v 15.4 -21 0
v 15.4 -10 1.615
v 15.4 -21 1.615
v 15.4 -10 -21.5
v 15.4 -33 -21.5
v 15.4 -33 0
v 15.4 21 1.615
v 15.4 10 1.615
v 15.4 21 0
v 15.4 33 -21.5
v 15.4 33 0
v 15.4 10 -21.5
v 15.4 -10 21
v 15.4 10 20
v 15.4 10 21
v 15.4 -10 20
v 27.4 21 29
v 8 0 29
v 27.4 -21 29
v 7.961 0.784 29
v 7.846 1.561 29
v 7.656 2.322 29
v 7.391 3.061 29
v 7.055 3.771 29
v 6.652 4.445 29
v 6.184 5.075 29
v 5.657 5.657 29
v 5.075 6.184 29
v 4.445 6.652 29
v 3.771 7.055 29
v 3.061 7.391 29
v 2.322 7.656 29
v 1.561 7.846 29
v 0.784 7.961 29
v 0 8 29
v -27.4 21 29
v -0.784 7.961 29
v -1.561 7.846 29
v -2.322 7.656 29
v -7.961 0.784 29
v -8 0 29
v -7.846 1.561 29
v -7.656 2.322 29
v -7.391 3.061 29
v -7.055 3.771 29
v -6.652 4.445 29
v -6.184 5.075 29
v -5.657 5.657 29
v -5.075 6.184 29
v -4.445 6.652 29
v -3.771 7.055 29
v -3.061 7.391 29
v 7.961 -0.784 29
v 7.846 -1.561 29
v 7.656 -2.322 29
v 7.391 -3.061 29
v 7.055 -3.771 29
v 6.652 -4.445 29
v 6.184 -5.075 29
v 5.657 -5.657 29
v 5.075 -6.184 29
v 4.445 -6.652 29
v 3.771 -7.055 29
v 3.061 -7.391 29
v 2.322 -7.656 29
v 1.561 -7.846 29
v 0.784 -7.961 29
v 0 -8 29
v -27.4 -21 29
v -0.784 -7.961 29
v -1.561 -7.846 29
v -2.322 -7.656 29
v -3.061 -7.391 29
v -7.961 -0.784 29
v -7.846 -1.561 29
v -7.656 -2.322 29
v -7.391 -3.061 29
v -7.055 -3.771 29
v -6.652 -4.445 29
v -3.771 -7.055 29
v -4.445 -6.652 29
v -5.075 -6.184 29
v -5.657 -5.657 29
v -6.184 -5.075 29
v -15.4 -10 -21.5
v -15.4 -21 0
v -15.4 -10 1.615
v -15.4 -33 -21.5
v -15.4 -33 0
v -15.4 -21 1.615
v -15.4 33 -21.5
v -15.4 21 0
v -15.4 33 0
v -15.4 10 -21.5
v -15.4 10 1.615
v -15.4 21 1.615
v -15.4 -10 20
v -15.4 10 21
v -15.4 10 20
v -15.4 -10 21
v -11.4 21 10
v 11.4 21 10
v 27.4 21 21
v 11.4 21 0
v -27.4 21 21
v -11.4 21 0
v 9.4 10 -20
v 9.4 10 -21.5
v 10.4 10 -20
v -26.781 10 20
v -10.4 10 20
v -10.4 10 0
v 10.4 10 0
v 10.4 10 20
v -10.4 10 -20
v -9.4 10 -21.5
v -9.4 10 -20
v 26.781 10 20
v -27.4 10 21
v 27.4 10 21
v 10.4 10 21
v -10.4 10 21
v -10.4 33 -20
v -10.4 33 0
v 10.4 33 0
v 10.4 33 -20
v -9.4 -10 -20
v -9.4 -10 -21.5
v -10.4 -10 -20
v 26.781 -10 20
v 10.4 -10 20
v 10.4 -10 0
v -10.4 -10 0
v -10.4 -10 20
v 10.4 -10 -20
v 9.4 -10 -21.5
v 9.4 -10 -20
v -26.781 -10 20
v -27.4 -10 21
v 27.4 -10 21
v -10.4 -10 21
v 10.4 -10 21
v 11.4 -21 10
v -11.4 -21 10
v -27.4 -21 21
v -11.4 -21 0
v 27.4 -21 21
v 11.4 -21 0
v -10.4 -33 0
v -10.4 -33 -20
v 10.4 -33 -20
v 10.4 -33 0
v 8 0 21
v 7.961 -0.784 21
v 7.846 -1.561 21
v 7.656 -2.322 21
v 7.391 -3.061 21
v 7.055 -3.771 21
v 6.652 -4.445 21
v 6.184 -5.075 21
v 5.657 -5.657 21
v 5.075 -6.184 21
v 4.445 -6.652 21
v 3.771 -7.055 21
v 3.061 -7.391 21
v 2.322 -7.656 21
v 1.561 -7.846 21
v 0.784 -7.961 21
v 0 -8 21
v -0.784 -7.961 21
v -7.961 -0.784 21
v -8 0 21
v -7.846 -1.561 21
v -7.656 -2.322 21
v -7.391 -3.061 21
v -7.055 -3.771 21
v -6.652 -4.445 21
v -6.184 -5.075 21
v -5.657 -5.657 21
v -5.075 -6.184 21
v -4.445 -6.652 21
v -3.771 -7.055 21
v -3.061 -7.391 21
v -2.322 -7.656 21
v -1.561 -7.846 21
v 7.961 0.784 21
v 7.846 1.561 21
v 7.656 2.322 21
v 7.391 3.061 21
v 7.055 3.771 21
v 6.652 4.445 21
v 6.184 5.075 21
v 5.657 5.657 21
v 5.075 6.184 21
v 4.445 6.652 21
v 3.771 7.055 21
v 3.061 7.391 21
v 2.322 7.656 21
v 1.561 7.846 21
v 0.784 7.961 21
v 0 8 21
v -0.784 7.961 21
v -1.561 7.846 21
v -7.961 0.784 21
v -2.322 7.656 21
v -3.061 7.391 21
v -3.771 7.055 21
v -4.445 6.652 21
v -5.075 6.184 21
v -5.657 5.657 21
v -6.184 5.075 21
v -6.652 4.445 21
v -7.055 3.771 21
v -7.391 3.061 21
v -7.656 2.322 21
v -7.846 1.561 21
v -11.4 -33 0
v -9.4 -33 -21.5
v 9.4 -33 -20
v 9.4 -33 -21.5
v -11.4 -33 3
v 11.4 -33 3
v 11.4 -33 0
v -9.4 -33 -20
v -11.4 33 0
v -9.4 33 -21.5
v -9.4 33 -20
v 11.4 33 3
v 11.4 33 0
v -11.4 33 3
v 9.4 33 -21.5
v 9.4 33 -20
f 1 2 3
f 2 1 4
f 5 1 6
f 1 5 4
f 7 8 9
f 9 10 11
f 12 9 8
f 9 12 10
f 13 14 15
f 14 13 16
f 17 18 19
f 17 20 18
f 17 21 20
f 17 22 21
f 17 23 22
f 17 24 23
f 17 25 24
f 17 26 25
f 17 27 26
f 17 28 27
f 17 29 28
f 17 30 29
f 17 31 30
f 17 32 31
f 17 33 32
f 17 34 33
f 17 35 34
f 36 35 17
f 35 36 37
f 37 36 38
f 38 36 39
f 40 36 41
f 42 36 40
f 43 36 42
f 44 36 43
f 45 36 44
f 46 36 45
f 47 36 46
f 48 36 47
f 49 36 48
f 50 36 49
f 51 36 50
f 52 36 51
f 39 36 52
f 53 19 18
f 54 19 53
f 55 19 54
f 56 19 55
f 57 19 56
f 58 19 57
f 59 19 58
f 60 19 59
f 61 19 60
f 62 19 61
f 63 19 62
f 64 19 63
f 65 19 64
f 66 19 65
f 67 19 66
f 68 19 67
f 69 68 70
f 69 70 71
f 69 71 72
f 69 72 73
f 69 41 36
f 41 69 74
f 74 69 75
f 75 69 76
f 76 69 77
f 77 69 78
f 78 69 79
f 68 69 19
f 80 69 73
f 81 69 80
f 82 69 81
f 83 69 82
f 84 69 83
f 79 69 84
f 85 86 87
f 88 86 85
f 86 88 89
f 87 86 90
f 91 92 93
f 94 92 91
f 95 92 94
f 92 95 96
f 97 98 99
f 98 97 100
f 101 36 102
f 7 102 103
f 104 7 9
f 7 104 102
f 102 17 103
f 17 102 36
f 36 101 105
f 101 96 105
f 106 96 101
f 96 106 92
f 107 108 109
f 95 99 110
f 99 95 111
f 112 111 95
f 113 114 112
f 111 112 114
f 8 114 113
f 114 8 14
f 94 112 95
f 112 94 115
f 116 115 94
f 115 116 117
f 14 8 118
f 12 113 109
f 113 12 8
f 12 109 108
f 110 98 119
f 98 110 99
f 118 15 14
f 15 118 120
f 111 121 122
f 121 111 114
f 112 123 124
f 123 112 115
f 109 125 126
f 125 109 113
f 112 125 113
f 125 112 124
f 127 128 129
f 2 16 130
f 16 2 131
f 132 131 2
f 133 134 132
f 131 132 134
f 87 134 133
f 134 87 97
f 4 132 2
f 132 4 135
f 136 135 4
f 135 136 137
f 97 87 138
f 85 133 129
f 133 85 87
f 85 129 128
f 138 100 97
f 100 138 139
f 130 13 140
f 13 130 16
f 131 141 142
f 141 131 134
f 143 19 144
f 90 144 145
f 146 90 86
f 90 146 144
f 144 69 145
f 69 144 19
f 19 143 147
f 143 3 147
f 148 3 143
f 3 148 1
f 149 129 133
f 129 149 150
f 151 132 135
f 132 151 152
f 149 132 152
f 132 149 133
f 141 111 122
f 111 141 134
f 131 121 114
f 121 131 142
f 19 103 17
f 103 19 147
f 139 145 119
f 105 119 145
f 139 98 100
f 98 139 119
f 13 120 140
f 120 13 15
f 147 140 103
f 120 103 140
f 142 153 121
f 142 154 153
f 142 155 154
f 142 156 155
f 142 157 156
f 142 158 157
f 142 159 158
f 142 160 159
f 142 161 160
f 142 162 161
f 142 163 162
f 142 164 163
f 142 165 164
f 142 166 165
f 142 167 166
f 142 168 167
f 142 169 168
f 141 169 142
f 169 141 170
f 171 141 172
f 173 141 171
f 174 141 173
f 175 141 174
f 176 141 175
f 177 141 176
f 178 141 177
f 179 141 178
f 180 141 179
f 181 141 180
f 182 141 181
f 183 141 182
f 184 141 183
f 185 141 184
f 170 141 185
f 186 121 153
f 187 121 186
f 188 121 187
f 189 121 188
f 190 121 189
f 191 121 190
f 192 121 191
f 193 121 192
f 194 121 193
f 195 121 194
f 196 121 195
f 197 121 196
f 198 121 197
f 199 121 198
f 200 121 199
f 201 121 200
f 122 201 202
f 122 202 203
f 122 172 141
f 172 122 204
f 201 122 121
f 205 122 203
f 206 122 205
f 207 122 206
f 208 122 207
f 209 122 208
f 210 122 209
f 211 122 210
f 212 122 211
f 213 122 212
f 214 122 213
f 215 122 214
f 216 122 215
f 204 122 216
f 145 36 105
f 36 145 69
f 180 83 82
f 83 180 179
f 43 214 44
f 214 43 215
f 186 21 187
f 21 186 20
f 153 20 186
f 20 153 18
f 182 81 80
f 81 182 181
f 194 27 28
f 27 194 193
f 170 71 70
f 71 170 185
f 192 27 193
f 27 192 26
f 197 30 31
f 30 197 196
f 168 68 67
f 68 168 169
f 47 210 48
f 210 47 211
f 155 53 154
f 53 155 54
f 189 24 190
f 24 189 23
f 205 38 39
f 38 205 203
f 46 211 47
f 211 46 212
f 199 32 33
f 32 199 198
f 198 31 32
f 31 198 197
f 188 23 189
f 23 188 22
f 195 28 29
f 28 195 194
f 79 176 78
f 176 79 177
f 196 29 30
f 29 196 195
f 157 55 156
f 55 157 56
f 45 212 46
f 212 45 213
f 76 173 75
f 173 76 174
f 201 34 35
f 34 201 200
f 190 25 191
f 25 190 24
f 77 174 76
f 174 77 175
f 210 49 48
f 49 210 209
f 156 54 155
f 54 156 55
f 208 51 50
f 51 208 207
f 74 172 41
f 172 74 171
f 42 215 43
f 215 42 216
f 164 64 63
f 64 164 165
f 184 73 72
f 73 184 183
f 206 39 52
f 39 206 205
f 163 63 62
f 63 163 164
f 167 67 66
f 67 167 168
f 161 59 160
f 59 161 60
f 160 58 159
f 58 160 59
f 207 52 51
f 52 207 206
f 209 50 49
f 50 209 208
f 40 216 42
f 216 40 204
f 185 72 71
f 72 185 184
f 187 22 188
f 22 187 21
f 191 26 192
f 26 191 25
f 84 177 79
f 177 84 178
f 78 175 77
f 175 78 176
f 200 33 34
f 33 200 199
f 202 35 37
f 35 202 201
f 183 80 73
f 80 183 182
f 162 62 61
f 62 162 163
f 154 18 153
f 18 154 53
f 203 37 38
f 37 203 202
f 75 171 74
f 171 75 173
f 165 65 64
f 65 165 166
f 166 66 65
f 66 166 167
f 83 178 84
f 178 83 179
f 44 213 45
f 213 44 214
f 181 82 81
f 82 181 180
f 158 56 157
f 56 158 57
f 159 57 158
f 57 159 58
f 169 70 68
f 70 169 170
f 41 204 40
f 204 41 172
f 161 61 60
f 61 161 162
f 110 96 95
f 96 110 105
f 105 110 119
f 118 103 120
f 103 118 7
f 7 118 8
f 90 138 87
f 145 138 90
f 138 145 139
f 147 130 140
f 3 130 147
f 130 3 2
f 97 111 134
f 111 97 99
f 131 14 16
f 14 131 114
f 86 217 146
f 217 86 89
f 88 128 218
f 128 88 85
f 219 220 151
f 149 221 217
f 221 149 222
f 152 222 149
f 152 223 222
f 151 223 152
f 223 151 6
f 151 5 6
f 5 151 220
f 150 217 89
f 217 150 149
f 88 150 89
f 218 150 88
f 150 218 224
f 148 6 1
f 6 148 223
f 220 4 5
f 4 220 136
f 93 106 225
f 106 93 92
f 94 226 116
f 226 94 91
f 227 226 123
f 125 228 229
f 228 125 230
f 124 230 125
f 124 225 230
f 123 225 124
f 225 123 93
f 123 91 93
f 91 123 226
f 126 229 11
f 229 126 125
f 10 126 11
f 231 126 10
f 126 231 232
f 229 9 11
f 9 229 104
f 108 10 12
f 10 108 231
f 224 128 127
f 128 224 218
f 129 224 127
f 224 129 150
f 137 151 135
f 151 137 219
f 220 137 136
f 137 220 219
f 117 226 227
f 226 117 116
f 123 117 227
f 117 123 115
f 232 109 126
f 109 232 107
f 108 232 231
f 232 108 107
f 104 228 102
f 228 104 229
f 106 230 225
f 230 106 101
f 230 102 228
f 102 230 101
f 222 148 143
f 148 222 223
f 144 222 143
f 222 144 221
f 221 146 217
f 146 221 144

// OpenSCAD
// file: ../perpendicular-u-joint-guard-v1.3-triangular-corner-fills/candidate_triangular_corner_fills.scad
// Candidate v1.3: four triangular concave-corner fill blocks.
//
// Base: accepted v0.7 eaves12 geometry. v0.9/v1.0/v1.1/v1.2 are not
// imported. Each corner block is a real triangular prism: broad at the roof,
// tapering continuously toward z=0, and overlapping the U side wall.

use <../perpendicular-u-joint-guard-v0.7/perpendicular_double_u_guard.scad>;

$fn = 48;
PART = "candidate_iso";

// Explicit v0.7 interface values.
roof_x_outer = 27.4;       // accepted eaves12 roof: -27.4..+27.4
side_wall_x_outer = 15.4;  // existing side-wall outer edge
blue_tube_x_outer = 10.0;  // blue lower 20x20 tube half-width
plate_y_inner = 10.0;
plate_y_outer = 21.0;
plate_depth_y = plate_y_outer - plate_y_inner; // 11 mm per front/back U plate

// The top edge is 0.5 mm inside the roof volume (roof underside z=21), and
// the lower point enters the side wall by 1 mm in X.  The XZ area therefore
// has positive overlap at both ends, not edge-only contact.
triangle_top_z = 21.5;
triangle_bottom_z = 0.0;
triangle_roof_overlap_z = triangle_top_z - 21.0;
triangle_side_overlap_x = 1.0;
triangle_inner_x = side_wall_x_outer - triangle_side_overlap_x; // 14.4

// Bottom retaining-hook contract copied from v0.7 for explicit verification.
hook_height_z = 1.5;
u_bottom_z = -21.0;
hook_top_z = u_bottom_z + hook_height_z; // -19.5

assert(plate_depth_y == 11, "每个三角块的前后板深必须是 11 mm");
assert(triangle_top_z > 21 && triangle_bottom_z == 0,
       "三角块上端必须搭入屋檐、下端落到 z=0");
assert(triangle_inner_x > blue_tube_x_outer,
       "三角块下端不得进入蓝色方管 x=-10..+10 包络");
assert(triangle_side_overlap_x > 0 && triangle_roof_overlap_z > 0,
       "三角块必须与屋檐和侧墙都有正重叠");
assert(hook_height_z == 1.5 && u_bottom_z == -21 && hook_top_z == -19.5,
       "底部卡脚必须保持 z=-21..-19.5");

// A polygon in XZ is extruded only through the corresponding front/back U
// plate. The center y=-10..+10 passage remains open.
module triangular_fill_xz(points, yc) {
    translate([0, yc, 0])
        rotate([90, 0, 0])
            linear_extrude(height = plate_depth_y,
                           center = true,
                           convexity = 10)
                polygon(points = points);
}

module front_neg_x_triangle() {
    // -X roof end -> +X inward. Top wide, lower point at the side wall.
    triangular_fill_xz([
        [-roof_x_outer, 21.0],
        [-triangle_inner_x, triangle_top_z],
        [-triangle_inner_x, triangle_bottom_z]
    ], (plate_y_inner + plate_y_outer) / 2);
}

module front_pos_x_triangle() {
    // +X roof end -> -X inward. Mirrored triangle.
    triangular_fill_xz([
        [roof_x_outer, 21.0],
        [triangle_inner_x, triangle_top_z],
        [triangle_inner_x, triangle_bottom_z]
    ], (plate_y_inner + plate_y_outer) / 2);
}

module back_neg_x_triangle() {
    triangular_fill_xz([
        [-roof_x_outer, 21.0],
        [-triangle_inner_x, triangle_top_z],
        [-triangle_inner_x, triangle_bottom_z]
    ], -(plate_y_inner + plate_y_outer) / 2);
}

module back_pos_x_triangle() {
    triangular_fill_xz([
        [roof_x_outer, 21.0],
        [triangle_inner_x, triangle_top_z],
        [triangle_inner_x, triangle_bottom_z]
    ], -(plate_y_inner + plate_y_outer) / 2);
}

module front_two_triangular_fills() {
    union() {
        front_neg_x_triangle();
        front_pos_x_triangle();
    }
}

module back_two_triangular_fills() {
    union() {
        back_neg_x_triangle();
        back_pos_x_triangle();
    }
}

module all_four_triangular_fills() {
    union() {
        front_two_triangular_fills();
        back_two_triangular_fills();
    }
}

module candidate_print_solid() {
    // Final hole operation is deliberately after the complete four-block
    // union; this preserves a true Z through-hole and the round nut pocket.
    difference() {
        union() {
            double_u_clip();
            all_four_triangular_fills();
        }
        vertical_screw_relief();
    }
}

module candidate_clip() {
    candidate_print_solid();
}

module candidate_assembly_iso() {
    upper_long_tube();
    lower_cross_tube();
    color([0.96, 0.39, 0.08]) double_u_clip();
    color([0.86, 0.13, 0.08]) front_two_triangular_fills();
    color([0.62, 0.12, 0.52]) back_two_triangular_fills();
    vertical_joint_screw();
}

module candidate_front_xz() {
    lower_cross_tube();
    color([0.96, 0.39, 0.08]) double_u_clip();
    color([0.86, 0.13, 0.08]) front_two_triangular_fills();
    vertical_joint_screw();
}

module candidate_back_xz() {
    lower_cross_tube();
    color([0.96, 0.39, 0.08]) double_u_clip();
    color([0.62, 0.12, 0.52]) back_two_triangular_fills();
    vertical_joint_screw();
}

module candidate_top_slice() {
    // At z=-0.5..2.5 the four blocks show their two front/back 11 mm bands;
    // the blue tube and the central y gap remain visible.
    slice_box = 200;
    color([0.28, 0.45, 0.78])
        intersection() {
            lower_cross_tube();
            translate([-slice_box / 2, -slice_box / 2, -0.5])
                cube([slice_box, slice_box, 3.0]);
        }
    color([0.96, 0.39, 0.08])
        intersection() {
            double_u_clip();
            translate([-slice_box / 2, -slice_box / 2, -0.5])
                cube([slice_box, slice_box, 3.0]);
        }
    color([0.86, 0.13, 0.08])
        intersection() {
            front_two_triangular_fills();
            translate([-slice_box / 2, -slice_box / 2, -0.5])
                cube([slice_box, slice_box, 3.0]);
        }
    color([0.62, 0.12, 0.52])
        intersection() {
            back_two_triangular_fills();
            translate([-slice_box / 2, -slice_box / 2, -0.5])
                cube([slice_box, slice_box, 3.0]);
        }
}

module candidate_hole_section() {
    // Center y=0 section: the bore and round nut pocket are shown without
    // confusing them with the bottom hook, which is outside this section.
    intersection() {
        candidate_print_solid();
        translate([-100, -0.4, -100]) cube([200, 0.8, 200]);
    }
}

module candidate_hook_check() {
    // Isolated lower detail: exact imported v0.7 U plate and blue tube, with
    // hook volumes highlighted only for review. This is not the print union.
    detail_box = 200;
    detail_z0 = -22;
    detail_h = 5;
    detail_y0 = 8;
    detail_ydepth = 15;
    intersection() {
        lower_cross_tube();
        translate([-detail_box / 2, detail_y0, detail_z0])
            cube([detail_box, detail_ydepth, detail_h]);
    }
    color([0.96, 0.39, 0.08])
        intersection() {
            u_plate(plate_y_inner, plate_y_outer);
            translate([-detail_box / 2, detail_y0, detail_z0])
                cube([detail_box, detail_ydepth, detail_h]);
        }
    color([0.20, 0.78, 0.20])
        intersection() {
            union() {
                translate([-13.65, 15.5, -20.25])
                    cube([3.5, 11, 1.5], center = true);
                translate([13.65, 15.5, -20.25])
                    cube([3.5, 11, 1.5], center = true);
            }
            translate([-detail_box / 2, detail_y0, detail_z0])
                cube([detail_box, detail_ydepth, detail_h]);
        }
}

if (PART == "candidate_clip") {
    candidate_clip();
} else if (PART == "candidate_front_xz") {
    candidate_front_xz();
} else if (PART == "candidate_back_xz") {
    candidate_back_xz();
} else if (PART == "candidate_top_slice") {
    candidate_top_slice();
} else if (PART == "candidate_hole_section") {
    candidate_hole_section();
} else if (PART == "candidate_hook_check") {
    candidate_hook_check();
} else {
    candidate_assembly_iso();
}
// file: ../perpendicular-u-joint-guard-v1.4-full-nut-passage/full_nut_passage_guard.scad
// v1.4: keep the exact v1.3 body; remove the nut-pocket floor with one
// full-depth Ø16 cylindrical subtraction. Units: mm; Z positive upwards.
// Imported v1.3 geometry contains all four triangles and the lower hooks.
use <../perpendicular-u-joint-guard-v1.3-triangular-corner-fills/candidate_triangular_corner_fills.scad>;

$fn = 48;
PART = "clip";
nut_passage_d = 16.0;

module full_depth_nut_passage() {
    // Cutter extends z=-31..39, past the whole printed z=-21..29 envelope.
    // 64 facets match the existing Ø16 pocket, avoiding a stepped profile.
    translate([0, 0, 4])
        cylinder(d = nut_passage_d, h = 70, center = true, $fn = 64);
}

module guard_v1_4() {
    difference() {
        candidate_print_solid();
        full_depth_nut_passage();
    }
}

guard_v1_4();
// file: ../perpendicular-u-joint-guard-v1.5-vertical-tube-clearance/vertical_tube_clearance_guard.scad
// v1.5: v1.4 Ø16 full nut passage + minimum downward-entry upper-tube slot.
// Units mm. X: upper long tube; Y: blue foot/front-back; Z: up.
use <../perpendicular-u-joint-guard-v1.4-full-nut-passage/full_nut_passage_guard.scad>;

$fn = 48;

module upper_pipe_vertical_entry_slot() {
    // Fixed gray upper tube: x=-60..60, y=-10..10, z=0..20.
    // While the clip moves down, that tube sweeps upward in clip coordinates.
    // A bottom-open slot ending at z=20 covers its whole relevant sweep in
    // the printed z=-21..29 envelope. Roof underside remains at z=21.
    // Preserve exact 20 mm Y width rather than silently adding fit clearance.
    translate([-60, -10, -31]) cube([120, 20, 51]);
}

module guard_v1_5() {
    difference() {
        guard_v1_4();
        upper_pipe_vertical_entry_slot();
    }
}

guard_v1_5();
// file: ../perpendicular-u-joint-guard-v1.8-lower-20plus1p5/lower_20plus1p5_guard.scad
// v1.8, mm. Rebuild the WHOLE lower U profile to the explicit 20+1.5 rule.
// Physical blue tube z=-20..0; contact wall height=20; inward lip below it
// z=-21.5..-20. No legacy u_bottom=-21 / lip top=-19.5 in the rebuilt lower.
use <../perpendicular-u-joint-guard-v1.5-vertical-tube-clearance/vertical_tube_clearance_guard.scad>;
use <../perpendicular-u-joint-guard-v1.4-full-nut-passage/full_nut_passage_guard.scad>;

$fn=48;
tube_size=20;
tube_top_z=0;
tube_bottom_z=tube_top_z-tube_size; // -20
lip_thickness_z=1.5;
lower_bottom_z=tube_bottom_z-lip_thickness_z; // -21.5
wall_thickness_x=5;
u_clearance_x=0.8;
inner_width_x=tube_size+u_clearance_x; // 20.8
outer_width_x=inner_width_x+2*wall_thickness_x; // 30.8
hook_depth_x=3.5;
u_inner_y=10;
u_outer_y=33; // original 21 + 12 mm along BLUE tube Y
upper_joint_overlap_z=0.1;

assert(tube_top_z-lower_bottom_z==21.5, "下部总高应为20+1.5=21.5 mm");
assert(2*u_inner_y==20, "中央Y通道应保持20 mm");

module upper_v1_5_preserved() {
    // Keep the accepted upper body. The 0.1 mm overlap is entirely within
    // the original arm footprint, ensuring a solid join without changing
    // the final upper shape or extending the new Y segments above z=0.
    intersection() {
        guard_v1_5();
        translate([-60,-60,-upper_joint_overlap_z])
            cube([120,120,70]);
    }
}

module lower_u_hooks() {
    // Same hook_depth_x, wall and X-clearance logic as the source v0.7 U.
    // Only Z is deliberately corrected to the new user's 20+1.5 definition.
    hook_xc=outer_width_x/2-wall_thickness_x/2-hook_depth_x/2; // 11.15
    for(yc=[-(u_inner_y+u_outer_y)/2,(u_inner_y+u_outer_y)/2])
        for(s=[-1,1])
            translate([s*hook_xc,yc,tube_bottom_z-lip_thickness_z/2])
                cube([hook_depth_x,u_outer_y-u_inner_y,lip_thickness_z],center=true);
}

module rebuilt_lower_u_pair() {
    wall_xc=inner_width_x/2+wall_thickness_x/2; // 12.9
    for(yc=[-(u_inner_y+u_outer_y)/2,(u_inner_y+u_outer_y)/2])
        for(s=[-1,1])
            translate([s*wall_xc,yc,(lower_bottom_z+tube_top_z)/2])
                cube([wall_thickness_x,u_outer_y-u_inner_y,
                      tube_top_z-lower_bottom_z],center=true);
    lower_u_hooks();
}

module guard_v1_8() {
    difference() {
        union() {
            upper_v1_5_preserved();
            rebuilt_lower_u_pair();
        }
        full_depth_nut_passage();
        upper_pipe_vertical_entry_slot();
    }
}

guard_v1_8();
// main file
// v1.9, mm: two Y-mirrored solid end ramps on the accepted v1.8 lower U.
// Blue tube top is z=0; ramp root |y|=21 rises 10 mm, tip |y|=33 rises 3 mm.
use <../perpendicular-u-joint-guard-v1.8-lower-20plus1p5/lower_20plus1p5_guard.scad>;
use <../perpendicular-u-joint-guard-v1.5-vertical-tube-clearance/vertical_tube_clearance_guard.scad>;
use <../perpendicular-u-joint-guard-v1.4-full-nut-passage/full_nut_passage_guard.scad>;

$fn=48;
ramp_root_y=21;
ramp_tip_y=33;
ramp_root_z=10;
ramp_tip_z=3;
u_inner_half_x=10.4; // v1.8 X inner width 20.8
ramp_sidewall_overlap_x=1;
ramp_half_x=u_inner_half_x+ramp_sidewall_overlap_x; // 11.4 / width 22.8
ramp_root_overlap_y=0.2;
ramp_joint_overlap_z=0.2;

module positive_end_ramp_prism() {
    // Local XY polygon is the physical YZ contour; extrusion maps to X.
    // The visible 21..33 interval is exactly a trapezoid: 10 -> 3 mm.
    // A hidden 0.2 mm root lap holds the 10 mm height inside the old body.
    rotate([90,0,90])
        linear_extrude(height=2*ramp_half_x,center=true,convexity=10)
            polygon(points=[
                [ramp_root_y-ramp_root_overlap_y,0],
                [ramp_tip_y,0],
                [ramp_tip_y,ramp_tip_z],
                [ramp_root_y,ramp_root_z],
                [ramp_root_y-ramp_root_overlap_y,ramp_root_z]
            ]);
}

module ramp_prisms_pair() {
    positive_end_ramp_prism();
    mirror([0,1,0]) positive_end_ramp_prism();
}

module sidewall_join_keys() {
    // Volumetric joins at both supporting side walls. The z<0 halves lie
    // entirely inside the existing v1.8 arms, so the lower geometry does not
    // change. Contact width is 1 mm in X on each side, over all 12 mm of Y.
    for(s=[-1,1]) for(y0=[-ramp_tip_y,ramp_root_y])
        translate([s*(u_inner_half_x+ramp_sidewall_overlap_x/2),
                   y0+(ramp_tip_y-ramp_root_y)/2,0])
            cube([ramp_sidewall_overlap_x,ramp_tip_y-ramp_root_y,
                  2*ramp_joint_overlap_z],center=true);
}

module mirrored_end_reinforcement() {
    ramp_prisms_pair();
    sidewall_join_keys();
}

module guard_v1_9() {
    difference() {
        union() { guard_v1_8(); mirrored_end_reinforcement(); }
        full_depth_nut_passage();
        upper_pipe_vertical_entry_slot();
    }
}

guard_v1_9();
